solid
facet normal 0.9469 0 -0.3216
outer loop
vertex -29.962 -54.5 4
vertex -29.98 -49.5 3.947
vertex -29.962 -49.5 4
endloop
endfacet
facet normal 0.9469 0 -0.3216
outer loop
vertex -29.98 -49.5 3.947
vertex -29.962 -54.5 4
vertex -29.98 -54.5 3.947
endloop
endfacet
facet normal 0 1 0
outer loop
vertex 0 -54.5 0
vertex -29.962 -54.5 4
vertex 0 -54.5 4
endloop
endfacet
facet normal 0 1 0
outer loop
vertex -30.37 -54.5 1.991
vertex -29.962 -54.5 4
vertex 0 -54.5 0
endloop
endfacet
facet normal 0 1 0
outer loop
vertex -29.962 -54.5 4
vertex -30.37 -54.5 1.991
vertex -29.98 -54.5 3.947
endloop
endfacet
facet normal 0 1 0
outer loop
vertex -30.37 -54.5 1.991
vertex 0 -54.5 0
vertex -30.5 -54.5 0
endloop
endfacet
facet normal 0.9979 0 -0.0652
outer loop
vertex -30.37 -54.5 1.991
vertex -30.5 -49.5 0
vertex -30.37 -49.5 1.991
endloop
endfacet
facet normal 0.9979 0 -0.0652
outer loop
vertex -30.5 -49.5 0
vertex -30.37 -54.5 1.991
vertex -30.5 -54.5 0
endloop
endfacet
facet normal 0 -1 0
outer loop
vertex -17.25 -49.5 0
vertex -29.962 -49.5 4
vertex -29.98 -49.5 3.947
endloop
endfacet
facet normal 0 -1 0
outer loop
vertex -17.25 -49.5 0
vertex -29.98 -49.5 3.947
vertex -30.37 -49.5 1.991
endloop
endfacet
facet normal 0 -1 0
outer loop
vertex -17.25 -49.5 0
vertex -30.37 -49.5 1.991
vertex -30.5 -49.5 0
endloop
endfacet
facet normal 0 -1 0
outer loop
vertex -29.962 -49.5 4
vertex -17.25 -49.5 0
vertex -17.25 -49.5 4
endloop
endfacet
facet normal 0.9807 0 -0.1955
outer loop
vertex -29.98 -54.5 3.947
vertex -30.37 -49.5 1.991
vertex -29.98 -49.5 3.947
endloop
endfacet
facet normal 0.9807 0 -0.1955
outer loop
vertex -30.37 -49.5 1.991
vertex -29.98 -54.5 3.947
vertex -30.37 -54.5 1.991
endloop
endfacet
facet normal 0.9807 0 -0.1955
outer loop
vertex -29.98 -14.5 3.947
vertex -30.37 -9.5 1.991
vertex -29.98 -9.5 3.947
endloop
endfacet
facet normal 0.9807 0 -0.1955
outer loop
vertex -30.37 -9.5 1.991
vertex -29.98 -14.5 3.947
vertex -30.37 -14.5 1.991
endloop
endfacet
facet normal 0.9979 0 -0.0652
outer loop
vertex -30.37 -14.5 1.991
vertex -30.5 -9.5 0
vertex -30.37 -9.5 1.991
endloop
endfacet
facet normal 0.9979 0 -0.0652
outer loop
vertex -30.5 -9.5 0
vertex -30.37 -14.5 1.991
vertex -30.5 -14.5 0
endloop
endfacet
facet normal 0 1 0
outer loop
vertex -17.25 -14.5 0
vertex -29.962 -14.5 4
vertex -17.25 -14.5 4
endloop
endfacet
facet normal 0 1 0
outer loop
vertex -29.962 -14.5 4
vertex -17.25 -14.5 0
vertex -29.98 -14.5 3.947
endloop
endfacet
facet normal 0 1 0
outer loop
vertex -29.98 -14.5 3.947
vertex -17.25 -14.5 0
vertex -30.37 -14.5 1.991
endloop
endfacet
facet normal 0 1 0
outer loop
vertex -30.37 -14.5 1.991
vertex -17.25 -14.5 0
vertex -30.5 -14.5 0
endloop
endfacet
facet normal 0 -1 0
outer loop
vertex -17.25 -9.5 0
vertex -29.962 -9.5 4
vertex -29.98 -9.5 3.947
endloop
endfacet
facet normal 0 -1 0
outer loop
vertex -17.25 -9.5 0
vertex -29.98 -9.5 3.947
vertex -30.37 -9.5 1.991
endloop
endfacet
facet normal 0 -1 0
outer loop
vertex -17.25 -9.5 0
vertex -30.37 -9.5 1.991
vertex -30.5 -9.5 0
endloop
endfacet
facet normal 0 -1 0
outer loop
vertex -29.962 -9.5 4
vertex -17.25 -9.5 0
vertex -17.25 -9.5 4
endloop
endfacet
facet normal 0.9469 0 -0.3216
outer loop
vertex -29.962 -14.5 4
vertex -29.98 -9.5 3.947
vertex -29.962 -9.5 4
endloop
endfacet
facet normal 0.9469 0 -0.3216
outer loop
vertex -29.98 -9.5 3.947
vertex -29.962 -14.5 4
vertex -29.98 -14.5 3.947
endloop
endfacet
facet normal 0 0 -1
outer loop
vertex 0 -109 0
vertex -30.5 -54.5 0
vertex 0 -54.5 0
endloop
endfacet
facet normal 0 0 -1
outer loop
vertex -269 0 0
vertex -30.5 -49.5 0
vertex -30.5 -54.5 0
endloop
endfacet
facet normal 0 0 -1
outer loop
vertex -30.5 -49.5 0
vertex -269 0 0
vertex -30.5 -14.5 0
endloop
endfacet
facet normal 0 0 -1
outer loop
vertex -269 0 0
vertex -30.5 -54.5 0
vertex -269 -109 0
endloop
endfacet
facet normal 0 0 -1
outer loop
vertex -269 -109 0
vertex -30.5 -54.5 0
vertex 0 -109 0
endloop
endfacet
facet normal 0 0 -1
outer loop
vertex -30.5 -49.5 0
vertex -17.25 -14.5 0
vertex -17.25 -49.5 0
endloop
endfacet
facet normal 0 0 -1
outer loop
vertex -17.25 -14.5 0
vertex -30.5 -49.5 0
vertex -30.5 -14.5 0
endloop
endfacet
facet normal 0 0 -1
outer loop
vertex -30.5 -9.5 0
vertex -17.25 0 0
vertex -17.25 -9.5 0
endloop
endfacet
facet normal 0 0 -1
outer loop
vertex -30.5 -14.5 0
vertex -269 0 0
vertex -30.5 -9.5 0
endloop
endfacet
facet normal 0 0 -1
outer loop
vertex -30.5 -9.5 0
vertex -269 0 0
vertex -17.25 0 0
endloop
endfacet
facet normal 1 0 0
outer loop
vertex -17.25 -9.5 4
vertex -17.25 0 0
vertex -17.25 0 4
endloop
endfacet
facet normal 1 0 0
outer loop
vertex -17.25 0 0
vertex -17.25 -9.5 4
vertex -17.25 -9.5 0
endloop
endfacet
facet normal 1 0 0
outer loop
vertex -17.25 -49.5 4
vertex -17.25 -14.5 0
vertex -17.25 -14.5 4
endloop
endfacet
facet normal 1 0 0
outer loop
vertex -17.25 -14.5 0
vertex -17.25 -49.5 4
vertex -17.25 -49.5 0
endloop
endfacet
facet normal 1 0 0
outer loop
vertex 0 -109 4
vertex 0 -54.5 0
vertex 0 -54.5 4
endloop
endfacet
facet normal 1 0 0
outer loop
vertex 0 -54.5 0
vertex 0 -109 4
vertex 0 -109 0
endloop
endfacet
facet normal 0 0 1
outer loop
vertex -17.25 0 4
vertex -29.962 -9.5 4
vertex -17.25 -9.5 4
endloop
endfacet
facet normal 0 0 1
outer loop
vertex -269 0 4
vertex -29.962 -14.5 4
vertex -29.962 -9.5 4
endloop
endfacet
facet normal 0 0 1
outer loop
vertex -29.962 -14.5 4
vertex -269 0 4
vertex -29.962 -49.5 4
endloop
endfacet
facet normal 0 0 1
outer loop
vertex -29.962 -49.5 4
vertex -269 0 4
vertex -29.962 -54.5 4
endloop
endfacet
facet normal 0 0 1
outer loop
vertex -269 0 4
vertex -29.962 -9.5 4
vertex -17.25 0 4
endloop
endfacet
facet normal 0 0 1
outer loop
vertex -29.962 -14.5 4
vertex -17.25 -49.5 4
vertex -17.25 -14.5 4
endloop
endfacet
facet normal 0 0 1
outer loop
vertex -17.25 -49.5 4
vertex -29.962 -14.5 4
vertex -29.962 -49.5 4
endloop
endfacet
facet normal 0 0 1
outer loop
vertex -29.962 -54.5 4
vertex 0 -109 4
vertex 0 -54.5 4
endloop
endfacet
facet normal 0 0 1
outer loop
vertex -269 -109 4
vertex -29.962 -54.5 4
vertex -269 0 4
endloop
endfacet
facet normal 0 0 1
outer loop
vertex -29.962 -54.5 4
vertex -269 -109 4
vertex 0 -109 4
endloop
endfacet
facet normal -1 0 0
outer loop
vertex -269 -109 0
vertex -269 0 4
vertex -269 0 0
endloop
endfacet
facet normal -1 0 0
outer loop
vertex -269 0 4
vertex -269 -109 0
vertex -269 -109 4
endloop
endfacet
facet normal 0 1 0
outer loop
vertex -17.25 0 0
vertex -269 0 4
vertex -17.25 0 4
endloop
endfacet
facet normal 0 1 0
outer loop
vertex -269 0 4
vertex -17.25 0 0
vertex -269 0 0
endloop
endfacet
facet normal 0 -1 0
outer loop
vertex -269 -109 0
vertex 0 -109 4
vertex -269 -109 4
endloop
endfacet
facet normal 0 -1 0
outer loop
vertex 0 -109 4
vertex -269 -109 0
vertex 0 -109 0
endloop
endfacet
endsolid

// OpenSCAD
// Tube rack - a flat plate with a regular grid of tube holes and two solid side walls.
// The two walls stand the rack up when it is flipped over after printing. NOVEL general part.
//

cols   = 6;
rows   = 2;
tube_d = 30.5;
pitch_x = 40;
pitch_y = 40;
plate_h = 4;
wall_h = 70;

$fn = 48;

edge = tube_d + 4;

difference() {
    translate([-X, -Y, 0]) cube([X, Y, plate_h]);
    for (i = [0 : cols - 1], j = [0 : rows - 1])
        translate([-(tube_d / 2), j * pitch_y - Y / 2, 0]) rotate([-90, 0, 0]) cylinder(h = plate_h + 1, d = tube_d);
    for (i = [0 : cols - 1])
        translate([-(edge / 2), -Y / 2, 0]) cube([edge, Y, wall_h]);
}

X = (cols - 1) * pitch_x + 2 * edge;
Y = (rows - 1) * pitch_y + 2 * edge;
